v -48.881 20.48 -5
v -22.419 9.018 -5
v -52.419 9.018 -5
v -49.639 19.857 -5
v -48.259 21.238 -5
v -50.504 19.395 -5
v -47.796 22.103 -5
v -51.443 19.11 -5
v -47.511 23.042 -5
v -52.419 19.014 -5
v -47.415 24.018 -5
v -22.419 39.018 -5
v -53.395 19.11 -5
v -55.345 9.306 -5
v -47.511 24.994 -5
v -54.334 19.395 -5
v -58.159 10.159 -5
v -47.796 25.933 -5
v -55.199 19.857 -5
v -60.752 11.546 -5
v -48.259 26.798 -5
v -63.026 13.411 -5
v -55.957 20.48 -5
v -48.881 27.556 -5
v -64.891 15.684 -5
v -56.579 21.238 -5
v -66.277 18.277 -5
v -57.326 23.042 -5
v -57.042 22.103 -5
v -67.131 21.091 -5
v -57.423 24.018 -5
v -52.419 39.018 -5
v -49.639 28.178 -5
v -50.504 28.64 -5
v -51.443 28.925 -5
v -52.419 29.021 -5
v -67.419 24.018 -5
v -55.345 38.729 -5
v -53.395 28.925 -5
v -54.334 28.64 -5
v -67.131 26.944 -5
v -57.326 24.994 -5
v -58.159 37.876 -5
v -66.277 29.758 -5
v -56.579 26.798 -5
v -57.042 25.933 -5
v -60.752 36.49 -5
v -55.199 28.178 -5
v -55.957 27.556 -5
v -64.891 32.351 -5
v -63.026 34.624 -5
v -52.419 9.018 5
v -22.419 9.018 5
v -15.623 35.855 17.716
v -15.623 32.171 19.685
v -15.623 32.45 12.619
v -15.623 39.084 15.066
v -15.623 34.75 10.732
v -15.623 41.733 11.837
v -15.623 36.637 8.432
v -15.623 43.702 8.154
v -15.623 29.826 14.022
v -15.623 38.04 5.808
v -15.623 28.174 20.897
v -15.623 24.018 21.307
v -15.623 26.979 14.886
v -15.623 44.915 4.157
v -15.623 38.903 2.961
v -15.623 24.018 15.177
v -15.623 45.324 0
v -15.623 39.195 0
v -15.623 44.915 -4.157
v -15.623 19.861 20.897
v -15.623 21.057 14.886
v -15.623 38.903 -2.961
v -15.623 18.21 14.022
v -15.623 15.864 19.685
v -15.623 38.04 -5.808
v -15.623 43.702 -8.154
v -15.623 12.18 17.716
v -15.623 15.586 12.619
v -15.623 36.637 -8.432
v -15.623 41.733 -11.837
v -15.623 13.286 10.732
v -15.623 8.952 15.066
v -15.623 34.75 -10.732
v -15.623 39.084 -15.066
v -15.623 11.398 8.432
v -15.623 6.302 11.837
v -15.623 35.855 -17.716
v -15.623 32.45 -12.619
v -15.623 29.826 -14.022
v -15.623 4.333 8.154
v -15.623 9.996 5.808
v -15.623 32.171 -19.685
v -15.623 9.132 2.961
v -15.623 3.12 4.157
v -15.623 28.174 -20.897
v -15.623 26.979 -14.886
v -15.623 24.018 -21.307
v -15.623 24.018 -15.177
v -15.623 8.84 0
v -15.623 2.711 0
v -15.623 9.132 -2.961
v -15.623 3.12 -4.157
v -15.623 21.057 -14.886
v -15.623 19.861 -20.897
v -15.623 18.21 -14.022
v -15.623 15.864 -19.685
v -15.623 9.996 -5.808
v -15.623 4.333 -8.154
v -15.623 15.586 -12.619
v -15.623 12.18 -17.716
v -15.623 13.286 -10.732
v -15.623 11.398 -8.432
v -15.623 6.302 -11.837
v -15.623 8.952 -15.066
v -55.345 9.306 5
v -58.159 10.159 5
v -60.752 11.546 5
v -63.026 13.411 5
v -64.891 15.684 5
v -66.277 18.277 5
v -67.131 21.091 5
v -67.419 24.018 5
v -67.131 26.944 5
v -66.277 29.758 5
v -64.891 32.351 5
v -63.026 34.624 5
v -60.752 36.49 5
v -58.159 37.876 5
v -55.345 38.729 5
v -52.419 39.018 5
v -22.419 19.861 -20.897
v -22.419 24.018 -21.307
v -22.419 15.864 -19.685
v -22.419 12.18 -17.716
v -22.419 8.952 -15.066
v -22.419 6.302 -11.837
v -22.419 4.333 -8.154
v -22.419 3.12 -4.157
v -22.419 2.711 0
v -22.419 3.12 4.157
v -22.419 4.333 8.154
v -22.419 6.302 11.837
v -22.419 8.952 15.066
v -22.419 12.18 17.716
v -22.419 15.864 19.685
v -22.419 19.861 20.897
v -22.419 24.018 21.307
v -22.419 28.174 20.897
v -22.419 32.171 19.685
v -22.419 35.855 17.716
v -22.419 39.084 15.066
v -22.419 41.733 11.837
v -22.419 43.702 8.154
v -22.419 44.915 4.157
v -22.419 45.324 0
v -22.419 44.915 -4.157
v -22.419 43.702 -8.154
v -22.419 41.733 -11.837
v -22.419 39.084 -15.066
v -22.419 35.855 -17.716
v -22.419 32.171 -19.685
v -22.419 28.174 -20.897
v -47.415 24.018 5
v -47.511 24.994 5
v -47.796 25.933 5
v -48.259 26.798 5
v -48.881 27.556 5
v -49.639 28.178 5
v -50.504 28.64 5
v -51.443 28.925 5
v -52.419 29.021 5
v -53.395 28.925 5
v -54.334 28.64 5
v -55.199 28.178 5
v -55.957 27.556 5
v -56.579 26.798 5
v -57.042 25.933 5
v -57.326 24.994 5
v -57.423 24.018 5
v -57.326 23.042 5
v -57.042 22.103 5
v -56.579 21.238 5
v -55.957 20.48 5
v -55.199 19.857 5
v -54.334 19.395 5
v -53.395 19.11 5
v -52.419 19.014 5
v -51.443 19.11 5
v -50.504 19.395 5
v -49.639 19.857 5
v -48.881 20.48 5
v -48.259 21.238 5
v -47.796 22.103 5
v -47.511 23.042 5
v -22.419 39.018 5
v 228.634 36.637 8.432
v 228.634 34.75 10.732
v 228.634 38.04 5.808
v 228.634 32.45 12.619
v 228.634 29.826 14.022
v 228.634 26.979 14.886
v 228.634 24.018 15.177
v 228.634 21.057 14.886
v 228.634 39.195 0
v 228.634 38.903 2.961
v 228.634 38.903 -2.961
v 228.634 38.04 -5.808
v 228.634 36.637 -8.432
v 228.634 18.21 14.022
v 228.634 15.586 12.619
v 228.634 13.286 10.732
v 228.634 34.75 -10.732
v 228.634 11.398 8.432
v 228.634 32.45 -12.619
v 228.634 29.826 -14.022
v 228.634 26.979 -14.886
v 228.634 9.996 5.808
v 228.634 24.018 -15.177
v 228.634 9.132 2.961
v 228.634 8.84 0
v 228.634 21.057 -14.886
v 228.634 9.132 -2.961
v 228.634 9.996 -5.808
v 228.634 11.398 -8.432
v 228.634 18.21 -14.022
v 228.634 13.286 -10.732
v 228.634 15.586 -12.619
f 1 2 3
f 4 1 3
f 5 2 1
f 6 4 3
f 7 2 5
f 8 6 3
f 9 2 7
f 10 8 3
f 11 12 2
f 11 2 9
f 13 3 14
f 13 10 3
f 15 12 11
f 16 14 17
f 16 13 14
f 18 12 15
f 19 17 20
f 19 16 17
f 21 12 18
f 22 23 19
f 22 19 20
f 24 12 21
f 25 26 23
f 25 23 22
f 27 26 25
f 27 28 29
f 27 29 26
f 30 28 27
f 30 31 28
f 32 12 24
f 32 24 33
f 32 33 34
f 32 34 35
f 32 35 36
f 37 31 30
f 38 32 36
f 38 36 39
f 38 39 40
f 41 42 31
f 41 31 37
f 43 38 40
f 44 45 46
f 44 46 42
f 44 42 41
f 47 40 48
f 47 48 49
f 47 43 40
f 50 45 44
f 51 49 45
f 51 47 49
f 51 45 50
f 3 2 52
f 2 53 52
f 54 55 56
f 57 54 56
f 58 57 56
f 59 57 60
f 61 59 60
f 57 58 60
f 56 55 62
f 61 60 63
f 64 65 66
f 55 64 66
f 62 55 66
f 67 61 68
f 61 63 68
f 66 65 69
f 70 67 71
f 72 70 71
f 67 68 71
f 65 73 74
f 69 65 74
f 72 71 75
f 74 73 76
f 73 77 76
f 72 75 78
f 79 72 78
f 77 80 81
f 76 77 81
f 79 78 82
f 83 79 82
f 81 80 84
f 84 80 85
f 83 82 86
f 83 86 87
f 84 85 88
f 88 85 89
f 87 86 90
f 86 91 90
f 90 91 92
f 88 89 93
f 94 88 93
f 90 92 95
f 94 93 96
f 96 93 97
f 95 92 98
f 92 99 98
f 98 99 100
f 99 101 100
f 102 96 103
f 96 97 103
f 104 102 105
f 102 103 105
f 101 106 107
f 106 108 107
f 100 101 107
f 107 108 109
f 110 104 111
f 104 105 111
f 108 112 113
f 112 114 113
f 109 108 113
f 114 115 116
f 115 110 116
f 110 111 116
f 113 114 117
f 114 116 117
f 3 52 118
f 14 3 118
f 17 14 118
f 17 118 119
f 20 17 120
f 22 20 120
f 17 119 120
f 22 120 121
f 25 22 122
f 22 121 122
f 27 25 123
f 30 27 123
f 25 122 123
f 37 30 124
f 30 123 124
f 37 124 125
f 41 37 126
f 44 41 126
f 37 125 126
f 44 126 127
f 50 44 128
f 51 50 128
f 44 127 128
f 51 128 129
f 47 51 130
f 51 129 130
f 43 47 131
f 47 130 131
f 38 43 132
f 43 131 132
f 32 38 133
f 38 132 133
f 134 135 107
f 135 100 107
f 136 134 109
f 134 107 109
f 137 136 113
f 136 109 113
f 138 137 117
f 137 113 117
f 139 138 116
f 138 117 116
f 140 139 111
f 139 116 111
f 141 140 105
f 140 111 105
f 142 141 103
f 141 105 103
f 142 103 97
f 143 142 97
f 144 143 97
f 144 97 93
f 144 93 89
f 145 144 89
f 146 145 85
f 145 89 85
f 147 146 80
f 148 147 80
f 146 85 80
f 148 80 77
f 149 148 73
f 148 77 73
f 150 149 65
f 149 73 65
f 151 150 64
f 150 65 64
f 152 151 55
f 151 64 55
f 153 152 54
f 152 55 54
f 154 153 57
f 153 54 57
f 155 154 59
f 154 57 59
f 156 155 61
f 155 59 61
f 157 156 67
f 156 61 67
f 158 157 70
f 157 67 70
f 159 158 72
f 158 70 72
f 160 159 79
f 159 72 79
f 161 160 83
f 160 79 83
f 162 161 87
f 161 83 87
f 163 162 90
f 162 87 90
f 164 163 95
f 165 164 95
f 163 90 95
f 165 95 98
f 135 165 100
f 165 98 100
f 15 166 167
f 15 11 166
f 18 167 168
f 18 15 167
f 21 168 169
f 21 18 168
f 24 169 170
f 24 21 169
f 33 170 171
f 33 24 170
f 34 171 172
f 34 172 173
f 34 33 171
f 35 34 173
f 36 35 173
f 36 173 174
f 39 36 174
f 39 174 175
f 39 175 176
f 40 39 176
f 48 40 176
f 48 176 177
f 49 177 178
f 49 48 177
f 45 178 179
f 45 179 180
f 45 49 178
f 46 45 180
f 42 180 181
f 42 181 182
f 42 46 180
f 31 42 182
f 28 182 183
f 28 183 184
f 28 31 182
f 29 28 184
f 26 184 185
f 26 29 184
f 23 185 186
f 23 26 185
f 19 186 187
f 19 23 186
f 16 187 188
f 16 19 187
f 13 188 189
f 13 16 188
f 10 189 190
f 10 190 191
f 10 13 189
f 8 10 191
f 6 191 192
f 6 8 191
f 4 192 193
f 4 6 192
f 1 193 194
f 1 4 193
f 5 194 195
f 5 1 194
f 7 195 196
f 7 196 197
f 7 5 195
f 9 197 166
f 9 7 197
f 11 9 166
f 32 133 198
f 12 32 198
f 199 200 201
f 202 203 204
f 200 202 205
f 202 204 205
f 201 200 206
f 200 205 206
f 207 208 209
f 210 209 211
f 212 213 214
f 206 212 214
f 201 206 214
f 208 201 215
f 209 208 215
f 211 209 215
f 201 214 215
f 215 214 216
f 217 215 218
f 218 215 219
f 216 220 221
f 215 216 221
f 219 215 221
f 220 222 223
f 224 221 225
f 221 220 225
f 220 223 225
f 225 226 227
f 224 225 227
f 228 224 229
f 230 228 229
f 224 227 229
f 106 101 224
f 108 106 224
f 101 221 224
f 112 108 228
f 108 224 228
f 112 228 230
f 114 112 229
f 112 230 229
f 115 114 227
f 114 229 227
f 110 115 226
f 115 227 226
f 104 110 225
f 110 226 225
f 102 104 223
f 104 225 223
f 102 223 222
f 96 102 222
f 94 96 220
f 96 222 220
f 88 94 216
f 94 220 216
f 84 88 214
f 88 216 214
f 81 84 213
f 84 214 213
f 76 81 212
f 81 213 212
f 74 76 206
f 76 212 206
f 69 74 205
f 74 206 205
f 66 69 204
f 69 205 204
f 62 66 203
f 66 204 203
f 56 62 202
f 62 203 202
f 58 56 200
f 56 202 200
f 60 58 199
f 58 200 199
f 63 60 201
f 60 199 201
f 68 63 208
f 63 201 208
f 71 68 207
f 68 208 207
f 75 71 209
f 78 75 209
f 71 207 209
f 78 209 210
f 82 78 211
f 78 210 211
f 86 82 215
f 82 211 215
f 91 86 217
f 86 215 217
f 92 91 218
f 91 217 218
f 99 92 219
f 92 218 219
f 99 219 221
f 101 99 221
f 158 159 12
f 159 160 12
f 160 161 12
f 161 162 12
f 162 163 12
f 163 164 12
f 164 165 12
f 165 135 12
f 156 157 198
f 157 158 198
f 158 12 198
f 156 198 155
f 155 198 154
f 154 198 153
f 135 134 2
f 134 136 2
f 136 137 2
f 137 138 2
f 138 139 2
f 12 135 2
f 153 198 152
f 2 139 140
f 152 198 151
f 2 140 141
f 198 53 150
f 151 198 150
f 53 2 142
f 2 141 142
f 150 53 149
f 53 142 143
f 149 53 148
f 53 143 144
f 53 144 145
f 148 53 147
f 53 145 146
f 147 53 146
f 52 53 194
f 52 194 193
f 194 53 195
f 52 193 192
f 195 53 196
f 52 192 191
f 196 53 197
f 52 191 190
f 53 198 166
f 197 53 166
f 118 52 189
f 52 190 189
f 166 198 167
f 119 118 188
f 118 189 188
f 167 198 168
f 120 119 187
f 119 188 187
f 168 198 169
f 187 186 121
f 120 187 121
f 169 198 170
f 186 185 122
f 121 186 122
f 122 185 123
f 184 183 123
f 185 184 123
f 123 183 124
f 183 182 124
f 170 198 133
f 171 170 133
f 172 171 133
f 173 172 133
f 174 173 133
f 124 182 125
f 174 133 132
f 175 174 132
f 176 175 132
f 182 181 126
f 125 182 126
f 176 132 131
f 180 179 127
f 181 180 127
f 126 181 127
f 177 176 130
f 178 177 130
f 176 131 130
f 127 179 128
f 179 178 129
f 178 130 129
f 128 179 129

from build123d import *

# Parameters (mm, degrees)
SKETCH1_R           = 5.00368331
BOSS_EXTRUDE1_DEPTH = 5


with BuildPart() as part:
    # Sketch1 → Boss-Extrude1 (new, symmetric)
    with BuildSketch(Plane.XY):
        with BuildLine():
            Line((-52.418935372, 39.017679889), (-22.418935372, 39.017679889))
            Line((-22.418935372, 39.017679889), (-22.418935372, 9.017679889))
            Line((-22.418935372, 9.017679889), (-52.418935372, 9.017679889))
            ThreePointArc((-52.418935372, 9.017679889), (-67.418935372, 24.017679889), (-52.418935372, 39.017679889))
        make_face()
        with Locations((-52.418935372, 24.017679889)):
            Circle(SKETCH1_R, mode=Mode.SUBTRACT)
    extrude(amount=BOSS_EXTRUDE1_DEPTH, both=True)

    # Sketch2 → Revolve4 (revolve)
    with BuildSketch(Plane.XY, mode=Mode.PRIVATE) as revolve4_sk:
        Polygon((-22.418935372, 24.017679889), (-22.418935372, 45.324269268), (-15.62342474, 45.324269268), (-15.62342474, 39.194903503), (228.633930204, 39.194903503), (228.633930204, 24.017679889), align=None)
    revolve(revolve4_sk.sketch.rotate(Axis((228.633930204, 24.017679889, 0), (-1, 0, 0)), 90), axis=Axis((228.633930204, 24.017679889, 0), (-1, 0, 0)))


solid = part.part
